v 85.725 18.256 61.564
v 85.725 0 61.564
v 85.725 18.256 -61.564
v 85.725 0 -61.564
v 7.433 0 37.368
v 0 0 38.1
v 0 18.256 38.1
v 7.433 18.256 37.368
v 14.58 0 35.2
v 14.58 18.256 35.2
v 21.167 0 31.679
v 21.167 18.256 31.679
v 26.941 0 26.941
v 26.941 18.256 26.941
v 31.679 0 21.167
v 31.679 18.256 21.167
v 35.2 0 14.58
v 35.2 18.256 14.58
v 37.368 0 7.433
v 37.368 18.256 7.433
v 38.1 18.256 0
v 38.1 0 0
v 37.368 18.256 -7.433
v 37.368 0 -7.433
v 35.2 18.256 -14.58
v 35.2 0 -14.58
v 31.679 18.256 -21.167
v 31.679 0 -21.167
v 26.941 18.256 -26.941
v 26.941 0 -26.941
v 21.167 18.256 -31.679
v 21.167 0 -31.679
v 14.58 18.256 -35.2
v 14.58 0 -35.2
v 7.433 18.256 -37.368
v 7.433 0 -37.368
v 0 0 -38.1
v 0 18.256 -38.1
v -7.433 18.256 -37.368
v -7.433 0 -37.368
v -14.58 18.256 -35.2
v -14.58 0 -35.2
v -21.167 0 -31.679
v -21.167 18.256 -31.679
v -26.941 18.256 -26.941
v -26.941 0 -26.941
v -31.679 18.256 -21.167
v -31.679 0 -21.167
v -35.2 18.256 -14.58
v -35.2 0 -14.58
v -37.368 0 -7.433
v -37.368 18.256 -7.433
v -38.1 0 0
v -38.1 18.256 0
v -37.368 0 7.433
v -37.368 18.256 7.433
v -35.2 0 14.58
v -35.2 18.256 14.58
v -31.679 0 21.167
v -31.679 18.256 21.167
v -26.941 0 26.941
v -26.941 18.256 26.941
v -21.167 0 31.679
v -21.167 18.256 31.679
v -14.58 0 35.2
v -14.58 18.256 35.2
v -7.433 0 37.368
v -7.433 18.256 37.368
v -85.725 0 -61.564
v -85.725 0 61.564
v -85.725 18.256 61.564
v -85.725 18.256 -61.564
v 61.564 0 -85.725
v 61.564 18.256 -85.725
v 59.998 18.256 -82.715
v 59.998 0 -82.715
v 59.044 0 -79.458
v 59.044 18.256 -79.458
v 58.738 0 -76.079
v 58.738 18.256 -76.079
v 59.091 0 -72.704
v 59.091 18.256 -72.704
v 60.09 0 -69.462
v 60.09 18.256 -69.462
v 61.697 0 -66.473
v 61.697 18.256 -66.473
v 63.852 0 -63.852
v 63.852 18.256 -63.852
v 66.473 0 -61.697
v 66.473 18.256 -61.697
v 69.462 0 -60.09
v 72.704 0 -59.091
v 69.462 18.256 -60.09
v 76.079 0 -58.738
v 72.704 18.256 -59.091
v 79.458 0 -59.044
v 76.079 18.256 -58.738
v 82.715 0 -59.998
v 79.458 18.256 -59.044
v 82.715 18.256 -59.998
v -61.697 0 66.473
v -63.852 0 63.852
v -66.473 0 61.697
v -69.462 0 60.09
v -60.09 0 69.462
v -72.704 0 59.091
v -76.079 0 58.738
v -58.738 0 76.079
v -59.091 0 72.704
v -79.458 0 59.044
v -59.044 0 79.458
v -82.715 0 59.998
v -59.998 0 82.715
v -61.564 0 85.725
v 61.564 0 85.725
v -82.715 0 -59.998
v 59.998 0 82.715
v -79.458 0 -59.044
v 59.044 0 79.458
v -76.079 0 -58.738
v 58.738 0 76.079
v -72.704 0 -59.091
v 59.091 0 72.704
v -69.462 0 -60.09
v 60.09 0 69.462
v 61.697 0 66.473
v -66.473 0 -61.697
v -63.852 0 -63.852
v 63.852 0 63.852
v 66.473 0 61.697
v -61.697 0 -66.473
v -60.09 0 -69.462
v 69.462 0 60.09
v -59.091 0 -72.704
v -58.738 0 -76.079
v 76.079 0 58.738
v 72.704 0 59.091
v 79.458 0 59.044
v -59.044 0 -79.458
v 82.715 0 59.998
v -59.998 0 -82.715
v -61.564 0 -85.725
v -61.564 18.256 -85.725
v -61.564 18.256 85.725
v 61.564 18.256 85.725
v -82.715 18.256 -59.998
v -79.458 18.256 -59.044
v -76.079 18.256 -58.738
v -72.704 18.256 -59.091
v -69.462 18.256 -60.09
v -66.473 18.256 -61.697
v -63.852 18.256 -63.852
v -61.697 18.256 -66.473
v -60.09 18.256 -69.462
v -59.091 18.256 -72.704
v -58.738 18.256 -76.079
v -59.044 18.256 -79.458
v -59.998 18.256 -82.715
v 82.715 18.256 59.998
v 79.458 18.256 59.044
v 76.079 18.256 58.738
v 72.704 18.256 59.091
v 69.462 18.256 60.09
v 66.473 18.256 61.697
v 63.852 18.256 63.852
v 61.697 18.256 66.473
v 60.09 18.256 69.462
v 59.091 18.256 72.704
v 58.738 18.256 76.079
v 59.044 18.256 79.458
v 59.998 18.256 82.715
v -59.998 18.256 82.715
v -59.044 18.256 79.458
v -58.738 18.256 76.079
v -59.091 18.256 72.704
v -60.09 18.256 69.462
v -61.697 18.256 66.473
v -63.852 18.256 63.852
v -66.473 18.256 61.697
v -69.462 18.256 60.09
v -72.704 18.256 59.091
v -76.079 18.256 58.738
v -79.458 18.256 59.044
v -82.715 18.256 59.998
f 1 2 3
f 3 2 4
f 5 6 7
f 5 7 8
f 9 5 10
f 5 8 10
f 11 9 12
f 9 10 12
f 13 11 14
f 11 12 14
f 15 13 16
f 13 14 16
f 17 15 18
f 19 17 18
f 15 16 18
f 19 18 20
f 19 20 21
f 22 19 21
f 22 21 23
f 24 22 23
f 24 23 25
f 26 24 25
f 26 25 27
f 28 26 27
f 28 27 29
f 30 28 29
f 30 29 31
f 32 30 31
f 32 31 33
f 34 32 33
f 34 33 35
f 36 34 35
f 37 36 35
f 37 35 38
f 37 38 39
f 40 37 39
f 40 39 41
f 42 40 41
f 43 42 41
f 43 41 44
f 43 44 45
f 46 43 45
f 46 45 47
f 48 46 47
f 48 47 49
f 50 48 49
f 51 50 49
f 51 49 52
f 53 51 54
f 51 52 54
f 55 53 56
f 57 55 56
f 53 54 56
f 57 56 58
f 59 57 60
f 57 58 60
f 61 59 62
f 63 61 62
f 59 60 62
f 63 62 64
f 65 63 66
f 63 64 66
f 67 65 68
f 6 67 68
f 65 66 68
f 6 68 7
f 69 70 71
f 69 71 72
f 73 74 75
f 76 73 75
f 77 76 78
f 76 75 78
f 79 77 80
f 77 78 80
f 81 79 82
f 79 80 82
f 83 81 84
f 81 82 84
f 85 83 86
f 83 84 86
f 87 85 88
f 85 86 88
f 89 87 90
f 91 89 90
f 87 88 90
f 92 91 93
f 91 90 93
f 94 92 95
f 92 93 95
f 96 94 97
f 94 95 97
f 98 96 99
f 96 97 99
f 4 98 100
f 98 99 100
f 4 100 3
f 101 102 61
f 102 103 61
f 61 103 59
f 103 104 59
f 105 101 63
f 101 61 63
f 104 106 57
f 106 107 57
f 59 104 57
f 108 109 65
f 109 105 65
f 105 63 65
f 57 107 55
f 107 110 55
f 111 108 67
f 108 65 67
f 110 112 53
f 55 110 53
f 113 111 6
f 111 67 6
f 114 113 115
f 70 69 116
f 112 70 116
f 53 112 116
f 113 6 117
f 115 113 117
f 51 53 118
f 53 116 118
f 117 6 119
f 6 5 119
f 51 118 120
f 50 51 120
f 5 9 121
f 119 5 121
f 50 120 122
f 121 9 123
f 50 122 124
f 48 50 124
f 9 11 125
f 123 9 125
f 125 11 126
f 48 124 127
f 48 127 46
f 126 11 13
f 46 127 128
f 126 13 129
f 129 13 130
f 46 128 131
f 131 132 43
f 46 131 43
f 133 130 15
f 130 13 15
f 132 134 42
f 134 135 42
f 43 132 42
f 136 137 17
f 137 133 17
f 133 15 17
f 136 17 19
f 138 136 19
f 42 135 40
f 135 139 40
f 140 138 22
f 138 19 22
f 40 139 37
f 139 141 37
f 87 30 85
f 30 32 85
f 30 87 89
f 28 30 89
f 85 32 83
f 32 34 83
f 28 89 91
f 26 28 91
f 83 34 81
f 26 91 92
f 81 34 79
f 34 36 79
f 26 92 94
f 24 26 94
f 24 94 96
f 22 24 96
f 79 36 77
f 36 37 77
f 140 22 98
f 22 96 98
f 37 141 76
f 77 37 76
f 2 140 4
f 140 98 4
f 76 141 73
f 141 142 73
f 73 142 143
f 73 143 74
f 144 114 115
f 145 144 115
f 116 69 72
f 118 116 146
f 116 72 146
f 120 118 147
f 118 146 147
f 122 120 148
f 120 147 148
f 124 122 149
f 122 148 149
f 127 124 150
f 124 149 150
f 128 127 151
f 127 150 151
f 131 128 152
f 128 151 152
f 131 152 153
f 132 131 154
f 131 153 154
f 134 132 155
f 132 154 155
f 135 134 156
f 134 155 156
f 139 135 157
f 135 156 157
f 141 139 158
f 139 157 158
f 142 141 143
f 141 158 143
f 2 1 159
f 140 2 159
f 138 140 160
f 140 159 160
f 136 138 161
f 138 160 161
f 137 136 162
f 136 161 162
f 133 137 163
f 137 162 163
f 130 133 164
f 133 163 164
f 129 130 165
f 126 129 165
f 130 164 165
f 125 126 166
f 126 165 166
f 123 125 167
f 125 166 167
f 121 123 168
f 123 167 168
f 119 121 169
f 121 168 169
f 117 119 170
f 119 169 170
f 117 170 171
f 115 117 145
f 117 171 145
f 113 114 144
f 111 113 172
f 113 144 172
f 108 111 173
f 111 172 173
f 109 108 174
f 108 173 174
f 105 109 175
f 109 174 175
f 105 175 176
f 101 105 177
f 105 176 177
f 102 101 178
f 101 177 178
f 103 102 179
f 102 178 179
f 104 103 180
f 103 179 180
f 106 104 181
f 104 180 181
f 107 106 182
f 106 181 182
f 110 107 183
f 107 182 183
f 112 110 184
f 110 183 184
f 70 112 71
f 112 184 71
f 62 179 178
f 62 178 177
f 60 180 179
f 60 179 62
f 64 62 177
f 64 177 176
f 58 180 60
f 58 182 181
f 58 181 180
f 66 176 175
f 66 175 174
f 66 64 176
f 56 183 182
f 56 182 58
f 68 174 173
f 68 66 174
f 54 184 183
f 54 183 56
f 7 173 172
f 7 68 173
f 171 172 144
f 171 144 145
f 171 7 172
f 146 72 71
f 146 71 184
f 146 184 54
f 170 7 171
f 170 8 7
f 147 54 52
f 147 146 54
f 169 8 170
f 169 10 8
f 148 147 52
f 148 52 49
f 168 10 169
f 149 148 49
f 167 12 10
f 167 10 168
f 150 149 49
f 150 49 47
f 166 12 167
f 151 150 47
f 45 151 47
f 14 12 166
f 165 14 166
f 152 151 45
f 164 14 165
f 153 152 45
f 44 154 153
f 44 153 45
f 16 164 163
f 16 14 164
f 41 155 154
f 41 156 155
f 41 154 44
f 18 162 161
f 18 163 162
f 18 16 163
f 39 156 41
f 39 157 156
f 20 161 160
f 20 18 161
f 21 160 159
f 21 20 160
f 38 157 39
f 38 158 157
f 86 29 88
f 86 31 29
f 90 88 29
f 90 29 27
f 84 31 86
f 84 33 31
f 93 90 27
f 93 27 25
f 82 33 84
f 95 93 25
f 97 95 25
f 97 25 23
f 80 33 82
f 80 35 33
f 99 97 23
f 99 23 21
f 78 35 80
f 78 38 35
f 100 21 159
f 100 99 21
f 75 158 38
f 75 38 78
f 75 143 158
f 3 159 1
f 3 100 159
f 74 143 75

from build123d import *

# Parameters (mm, degrees)
SKETCH1_W           = 171.45
SKETCH1_H           = 171.45
BOSS_EXTRUDE1_DEPTH = 18.25625
SKETCH2_R           = 17.4625
CUT_EXTRUDE1_DEPTH  = 123.60033407
SKETCH5_R           = 38.1
CUT_EXTRUDE2_DEPTH  = 123.60033407


with BuildPart() as part:
    # Sketch1 → Boss-Extrude1 (new body)
    with BuildSketch(Plane(origin=(0, 0, 0), x_dir=(1, 0, 0), z_dir=(0, 1, 0))):
        Rectangle(SKETCH1_W, SKETCH1_H)
    extrude(amount=BOSS_EXTRUDE1_DEPTH)

    # Sketch2 → Cut-Extrude1 (cut, through all)
    with BuildSketch(Plane(origin=(0, 18.25625, 0), x_dir=(1, 0, 0), z_dir=(0, 1, 0))):
        with Locations((-76.2, 76.2)):
            Circle(SKETCH2_R)
        with Locations((76.2, 76.2)):
            Circle(SKETCH2_R)
        with Locations((76.2, -76.2)):
            Circle(SKETCH2_R)
        with Locations((-76.2, -76.2)):
            Circle(SKETCH2_R)
    extrude(amount=-CUT_EXTRUDE1_DEPTH, mode=Mode.SUBTRACT)

    # Sketch5 → Cut-Extrude2 (cut, through all)
    with BuildSketch(Plane(origin=(0, 18.25625, 0), x_dir=(1, 0, 0), z_dir=(0, 1, 0))):
        with Locations(Location((0, 0, 0), (0, 0, 270))):
            Circle(SKETCH5_R)
    extrude(amount=-CUT_EXTRUDE2_DEPTH, mode=Mode.SUBTRACT)


solid = part.part
